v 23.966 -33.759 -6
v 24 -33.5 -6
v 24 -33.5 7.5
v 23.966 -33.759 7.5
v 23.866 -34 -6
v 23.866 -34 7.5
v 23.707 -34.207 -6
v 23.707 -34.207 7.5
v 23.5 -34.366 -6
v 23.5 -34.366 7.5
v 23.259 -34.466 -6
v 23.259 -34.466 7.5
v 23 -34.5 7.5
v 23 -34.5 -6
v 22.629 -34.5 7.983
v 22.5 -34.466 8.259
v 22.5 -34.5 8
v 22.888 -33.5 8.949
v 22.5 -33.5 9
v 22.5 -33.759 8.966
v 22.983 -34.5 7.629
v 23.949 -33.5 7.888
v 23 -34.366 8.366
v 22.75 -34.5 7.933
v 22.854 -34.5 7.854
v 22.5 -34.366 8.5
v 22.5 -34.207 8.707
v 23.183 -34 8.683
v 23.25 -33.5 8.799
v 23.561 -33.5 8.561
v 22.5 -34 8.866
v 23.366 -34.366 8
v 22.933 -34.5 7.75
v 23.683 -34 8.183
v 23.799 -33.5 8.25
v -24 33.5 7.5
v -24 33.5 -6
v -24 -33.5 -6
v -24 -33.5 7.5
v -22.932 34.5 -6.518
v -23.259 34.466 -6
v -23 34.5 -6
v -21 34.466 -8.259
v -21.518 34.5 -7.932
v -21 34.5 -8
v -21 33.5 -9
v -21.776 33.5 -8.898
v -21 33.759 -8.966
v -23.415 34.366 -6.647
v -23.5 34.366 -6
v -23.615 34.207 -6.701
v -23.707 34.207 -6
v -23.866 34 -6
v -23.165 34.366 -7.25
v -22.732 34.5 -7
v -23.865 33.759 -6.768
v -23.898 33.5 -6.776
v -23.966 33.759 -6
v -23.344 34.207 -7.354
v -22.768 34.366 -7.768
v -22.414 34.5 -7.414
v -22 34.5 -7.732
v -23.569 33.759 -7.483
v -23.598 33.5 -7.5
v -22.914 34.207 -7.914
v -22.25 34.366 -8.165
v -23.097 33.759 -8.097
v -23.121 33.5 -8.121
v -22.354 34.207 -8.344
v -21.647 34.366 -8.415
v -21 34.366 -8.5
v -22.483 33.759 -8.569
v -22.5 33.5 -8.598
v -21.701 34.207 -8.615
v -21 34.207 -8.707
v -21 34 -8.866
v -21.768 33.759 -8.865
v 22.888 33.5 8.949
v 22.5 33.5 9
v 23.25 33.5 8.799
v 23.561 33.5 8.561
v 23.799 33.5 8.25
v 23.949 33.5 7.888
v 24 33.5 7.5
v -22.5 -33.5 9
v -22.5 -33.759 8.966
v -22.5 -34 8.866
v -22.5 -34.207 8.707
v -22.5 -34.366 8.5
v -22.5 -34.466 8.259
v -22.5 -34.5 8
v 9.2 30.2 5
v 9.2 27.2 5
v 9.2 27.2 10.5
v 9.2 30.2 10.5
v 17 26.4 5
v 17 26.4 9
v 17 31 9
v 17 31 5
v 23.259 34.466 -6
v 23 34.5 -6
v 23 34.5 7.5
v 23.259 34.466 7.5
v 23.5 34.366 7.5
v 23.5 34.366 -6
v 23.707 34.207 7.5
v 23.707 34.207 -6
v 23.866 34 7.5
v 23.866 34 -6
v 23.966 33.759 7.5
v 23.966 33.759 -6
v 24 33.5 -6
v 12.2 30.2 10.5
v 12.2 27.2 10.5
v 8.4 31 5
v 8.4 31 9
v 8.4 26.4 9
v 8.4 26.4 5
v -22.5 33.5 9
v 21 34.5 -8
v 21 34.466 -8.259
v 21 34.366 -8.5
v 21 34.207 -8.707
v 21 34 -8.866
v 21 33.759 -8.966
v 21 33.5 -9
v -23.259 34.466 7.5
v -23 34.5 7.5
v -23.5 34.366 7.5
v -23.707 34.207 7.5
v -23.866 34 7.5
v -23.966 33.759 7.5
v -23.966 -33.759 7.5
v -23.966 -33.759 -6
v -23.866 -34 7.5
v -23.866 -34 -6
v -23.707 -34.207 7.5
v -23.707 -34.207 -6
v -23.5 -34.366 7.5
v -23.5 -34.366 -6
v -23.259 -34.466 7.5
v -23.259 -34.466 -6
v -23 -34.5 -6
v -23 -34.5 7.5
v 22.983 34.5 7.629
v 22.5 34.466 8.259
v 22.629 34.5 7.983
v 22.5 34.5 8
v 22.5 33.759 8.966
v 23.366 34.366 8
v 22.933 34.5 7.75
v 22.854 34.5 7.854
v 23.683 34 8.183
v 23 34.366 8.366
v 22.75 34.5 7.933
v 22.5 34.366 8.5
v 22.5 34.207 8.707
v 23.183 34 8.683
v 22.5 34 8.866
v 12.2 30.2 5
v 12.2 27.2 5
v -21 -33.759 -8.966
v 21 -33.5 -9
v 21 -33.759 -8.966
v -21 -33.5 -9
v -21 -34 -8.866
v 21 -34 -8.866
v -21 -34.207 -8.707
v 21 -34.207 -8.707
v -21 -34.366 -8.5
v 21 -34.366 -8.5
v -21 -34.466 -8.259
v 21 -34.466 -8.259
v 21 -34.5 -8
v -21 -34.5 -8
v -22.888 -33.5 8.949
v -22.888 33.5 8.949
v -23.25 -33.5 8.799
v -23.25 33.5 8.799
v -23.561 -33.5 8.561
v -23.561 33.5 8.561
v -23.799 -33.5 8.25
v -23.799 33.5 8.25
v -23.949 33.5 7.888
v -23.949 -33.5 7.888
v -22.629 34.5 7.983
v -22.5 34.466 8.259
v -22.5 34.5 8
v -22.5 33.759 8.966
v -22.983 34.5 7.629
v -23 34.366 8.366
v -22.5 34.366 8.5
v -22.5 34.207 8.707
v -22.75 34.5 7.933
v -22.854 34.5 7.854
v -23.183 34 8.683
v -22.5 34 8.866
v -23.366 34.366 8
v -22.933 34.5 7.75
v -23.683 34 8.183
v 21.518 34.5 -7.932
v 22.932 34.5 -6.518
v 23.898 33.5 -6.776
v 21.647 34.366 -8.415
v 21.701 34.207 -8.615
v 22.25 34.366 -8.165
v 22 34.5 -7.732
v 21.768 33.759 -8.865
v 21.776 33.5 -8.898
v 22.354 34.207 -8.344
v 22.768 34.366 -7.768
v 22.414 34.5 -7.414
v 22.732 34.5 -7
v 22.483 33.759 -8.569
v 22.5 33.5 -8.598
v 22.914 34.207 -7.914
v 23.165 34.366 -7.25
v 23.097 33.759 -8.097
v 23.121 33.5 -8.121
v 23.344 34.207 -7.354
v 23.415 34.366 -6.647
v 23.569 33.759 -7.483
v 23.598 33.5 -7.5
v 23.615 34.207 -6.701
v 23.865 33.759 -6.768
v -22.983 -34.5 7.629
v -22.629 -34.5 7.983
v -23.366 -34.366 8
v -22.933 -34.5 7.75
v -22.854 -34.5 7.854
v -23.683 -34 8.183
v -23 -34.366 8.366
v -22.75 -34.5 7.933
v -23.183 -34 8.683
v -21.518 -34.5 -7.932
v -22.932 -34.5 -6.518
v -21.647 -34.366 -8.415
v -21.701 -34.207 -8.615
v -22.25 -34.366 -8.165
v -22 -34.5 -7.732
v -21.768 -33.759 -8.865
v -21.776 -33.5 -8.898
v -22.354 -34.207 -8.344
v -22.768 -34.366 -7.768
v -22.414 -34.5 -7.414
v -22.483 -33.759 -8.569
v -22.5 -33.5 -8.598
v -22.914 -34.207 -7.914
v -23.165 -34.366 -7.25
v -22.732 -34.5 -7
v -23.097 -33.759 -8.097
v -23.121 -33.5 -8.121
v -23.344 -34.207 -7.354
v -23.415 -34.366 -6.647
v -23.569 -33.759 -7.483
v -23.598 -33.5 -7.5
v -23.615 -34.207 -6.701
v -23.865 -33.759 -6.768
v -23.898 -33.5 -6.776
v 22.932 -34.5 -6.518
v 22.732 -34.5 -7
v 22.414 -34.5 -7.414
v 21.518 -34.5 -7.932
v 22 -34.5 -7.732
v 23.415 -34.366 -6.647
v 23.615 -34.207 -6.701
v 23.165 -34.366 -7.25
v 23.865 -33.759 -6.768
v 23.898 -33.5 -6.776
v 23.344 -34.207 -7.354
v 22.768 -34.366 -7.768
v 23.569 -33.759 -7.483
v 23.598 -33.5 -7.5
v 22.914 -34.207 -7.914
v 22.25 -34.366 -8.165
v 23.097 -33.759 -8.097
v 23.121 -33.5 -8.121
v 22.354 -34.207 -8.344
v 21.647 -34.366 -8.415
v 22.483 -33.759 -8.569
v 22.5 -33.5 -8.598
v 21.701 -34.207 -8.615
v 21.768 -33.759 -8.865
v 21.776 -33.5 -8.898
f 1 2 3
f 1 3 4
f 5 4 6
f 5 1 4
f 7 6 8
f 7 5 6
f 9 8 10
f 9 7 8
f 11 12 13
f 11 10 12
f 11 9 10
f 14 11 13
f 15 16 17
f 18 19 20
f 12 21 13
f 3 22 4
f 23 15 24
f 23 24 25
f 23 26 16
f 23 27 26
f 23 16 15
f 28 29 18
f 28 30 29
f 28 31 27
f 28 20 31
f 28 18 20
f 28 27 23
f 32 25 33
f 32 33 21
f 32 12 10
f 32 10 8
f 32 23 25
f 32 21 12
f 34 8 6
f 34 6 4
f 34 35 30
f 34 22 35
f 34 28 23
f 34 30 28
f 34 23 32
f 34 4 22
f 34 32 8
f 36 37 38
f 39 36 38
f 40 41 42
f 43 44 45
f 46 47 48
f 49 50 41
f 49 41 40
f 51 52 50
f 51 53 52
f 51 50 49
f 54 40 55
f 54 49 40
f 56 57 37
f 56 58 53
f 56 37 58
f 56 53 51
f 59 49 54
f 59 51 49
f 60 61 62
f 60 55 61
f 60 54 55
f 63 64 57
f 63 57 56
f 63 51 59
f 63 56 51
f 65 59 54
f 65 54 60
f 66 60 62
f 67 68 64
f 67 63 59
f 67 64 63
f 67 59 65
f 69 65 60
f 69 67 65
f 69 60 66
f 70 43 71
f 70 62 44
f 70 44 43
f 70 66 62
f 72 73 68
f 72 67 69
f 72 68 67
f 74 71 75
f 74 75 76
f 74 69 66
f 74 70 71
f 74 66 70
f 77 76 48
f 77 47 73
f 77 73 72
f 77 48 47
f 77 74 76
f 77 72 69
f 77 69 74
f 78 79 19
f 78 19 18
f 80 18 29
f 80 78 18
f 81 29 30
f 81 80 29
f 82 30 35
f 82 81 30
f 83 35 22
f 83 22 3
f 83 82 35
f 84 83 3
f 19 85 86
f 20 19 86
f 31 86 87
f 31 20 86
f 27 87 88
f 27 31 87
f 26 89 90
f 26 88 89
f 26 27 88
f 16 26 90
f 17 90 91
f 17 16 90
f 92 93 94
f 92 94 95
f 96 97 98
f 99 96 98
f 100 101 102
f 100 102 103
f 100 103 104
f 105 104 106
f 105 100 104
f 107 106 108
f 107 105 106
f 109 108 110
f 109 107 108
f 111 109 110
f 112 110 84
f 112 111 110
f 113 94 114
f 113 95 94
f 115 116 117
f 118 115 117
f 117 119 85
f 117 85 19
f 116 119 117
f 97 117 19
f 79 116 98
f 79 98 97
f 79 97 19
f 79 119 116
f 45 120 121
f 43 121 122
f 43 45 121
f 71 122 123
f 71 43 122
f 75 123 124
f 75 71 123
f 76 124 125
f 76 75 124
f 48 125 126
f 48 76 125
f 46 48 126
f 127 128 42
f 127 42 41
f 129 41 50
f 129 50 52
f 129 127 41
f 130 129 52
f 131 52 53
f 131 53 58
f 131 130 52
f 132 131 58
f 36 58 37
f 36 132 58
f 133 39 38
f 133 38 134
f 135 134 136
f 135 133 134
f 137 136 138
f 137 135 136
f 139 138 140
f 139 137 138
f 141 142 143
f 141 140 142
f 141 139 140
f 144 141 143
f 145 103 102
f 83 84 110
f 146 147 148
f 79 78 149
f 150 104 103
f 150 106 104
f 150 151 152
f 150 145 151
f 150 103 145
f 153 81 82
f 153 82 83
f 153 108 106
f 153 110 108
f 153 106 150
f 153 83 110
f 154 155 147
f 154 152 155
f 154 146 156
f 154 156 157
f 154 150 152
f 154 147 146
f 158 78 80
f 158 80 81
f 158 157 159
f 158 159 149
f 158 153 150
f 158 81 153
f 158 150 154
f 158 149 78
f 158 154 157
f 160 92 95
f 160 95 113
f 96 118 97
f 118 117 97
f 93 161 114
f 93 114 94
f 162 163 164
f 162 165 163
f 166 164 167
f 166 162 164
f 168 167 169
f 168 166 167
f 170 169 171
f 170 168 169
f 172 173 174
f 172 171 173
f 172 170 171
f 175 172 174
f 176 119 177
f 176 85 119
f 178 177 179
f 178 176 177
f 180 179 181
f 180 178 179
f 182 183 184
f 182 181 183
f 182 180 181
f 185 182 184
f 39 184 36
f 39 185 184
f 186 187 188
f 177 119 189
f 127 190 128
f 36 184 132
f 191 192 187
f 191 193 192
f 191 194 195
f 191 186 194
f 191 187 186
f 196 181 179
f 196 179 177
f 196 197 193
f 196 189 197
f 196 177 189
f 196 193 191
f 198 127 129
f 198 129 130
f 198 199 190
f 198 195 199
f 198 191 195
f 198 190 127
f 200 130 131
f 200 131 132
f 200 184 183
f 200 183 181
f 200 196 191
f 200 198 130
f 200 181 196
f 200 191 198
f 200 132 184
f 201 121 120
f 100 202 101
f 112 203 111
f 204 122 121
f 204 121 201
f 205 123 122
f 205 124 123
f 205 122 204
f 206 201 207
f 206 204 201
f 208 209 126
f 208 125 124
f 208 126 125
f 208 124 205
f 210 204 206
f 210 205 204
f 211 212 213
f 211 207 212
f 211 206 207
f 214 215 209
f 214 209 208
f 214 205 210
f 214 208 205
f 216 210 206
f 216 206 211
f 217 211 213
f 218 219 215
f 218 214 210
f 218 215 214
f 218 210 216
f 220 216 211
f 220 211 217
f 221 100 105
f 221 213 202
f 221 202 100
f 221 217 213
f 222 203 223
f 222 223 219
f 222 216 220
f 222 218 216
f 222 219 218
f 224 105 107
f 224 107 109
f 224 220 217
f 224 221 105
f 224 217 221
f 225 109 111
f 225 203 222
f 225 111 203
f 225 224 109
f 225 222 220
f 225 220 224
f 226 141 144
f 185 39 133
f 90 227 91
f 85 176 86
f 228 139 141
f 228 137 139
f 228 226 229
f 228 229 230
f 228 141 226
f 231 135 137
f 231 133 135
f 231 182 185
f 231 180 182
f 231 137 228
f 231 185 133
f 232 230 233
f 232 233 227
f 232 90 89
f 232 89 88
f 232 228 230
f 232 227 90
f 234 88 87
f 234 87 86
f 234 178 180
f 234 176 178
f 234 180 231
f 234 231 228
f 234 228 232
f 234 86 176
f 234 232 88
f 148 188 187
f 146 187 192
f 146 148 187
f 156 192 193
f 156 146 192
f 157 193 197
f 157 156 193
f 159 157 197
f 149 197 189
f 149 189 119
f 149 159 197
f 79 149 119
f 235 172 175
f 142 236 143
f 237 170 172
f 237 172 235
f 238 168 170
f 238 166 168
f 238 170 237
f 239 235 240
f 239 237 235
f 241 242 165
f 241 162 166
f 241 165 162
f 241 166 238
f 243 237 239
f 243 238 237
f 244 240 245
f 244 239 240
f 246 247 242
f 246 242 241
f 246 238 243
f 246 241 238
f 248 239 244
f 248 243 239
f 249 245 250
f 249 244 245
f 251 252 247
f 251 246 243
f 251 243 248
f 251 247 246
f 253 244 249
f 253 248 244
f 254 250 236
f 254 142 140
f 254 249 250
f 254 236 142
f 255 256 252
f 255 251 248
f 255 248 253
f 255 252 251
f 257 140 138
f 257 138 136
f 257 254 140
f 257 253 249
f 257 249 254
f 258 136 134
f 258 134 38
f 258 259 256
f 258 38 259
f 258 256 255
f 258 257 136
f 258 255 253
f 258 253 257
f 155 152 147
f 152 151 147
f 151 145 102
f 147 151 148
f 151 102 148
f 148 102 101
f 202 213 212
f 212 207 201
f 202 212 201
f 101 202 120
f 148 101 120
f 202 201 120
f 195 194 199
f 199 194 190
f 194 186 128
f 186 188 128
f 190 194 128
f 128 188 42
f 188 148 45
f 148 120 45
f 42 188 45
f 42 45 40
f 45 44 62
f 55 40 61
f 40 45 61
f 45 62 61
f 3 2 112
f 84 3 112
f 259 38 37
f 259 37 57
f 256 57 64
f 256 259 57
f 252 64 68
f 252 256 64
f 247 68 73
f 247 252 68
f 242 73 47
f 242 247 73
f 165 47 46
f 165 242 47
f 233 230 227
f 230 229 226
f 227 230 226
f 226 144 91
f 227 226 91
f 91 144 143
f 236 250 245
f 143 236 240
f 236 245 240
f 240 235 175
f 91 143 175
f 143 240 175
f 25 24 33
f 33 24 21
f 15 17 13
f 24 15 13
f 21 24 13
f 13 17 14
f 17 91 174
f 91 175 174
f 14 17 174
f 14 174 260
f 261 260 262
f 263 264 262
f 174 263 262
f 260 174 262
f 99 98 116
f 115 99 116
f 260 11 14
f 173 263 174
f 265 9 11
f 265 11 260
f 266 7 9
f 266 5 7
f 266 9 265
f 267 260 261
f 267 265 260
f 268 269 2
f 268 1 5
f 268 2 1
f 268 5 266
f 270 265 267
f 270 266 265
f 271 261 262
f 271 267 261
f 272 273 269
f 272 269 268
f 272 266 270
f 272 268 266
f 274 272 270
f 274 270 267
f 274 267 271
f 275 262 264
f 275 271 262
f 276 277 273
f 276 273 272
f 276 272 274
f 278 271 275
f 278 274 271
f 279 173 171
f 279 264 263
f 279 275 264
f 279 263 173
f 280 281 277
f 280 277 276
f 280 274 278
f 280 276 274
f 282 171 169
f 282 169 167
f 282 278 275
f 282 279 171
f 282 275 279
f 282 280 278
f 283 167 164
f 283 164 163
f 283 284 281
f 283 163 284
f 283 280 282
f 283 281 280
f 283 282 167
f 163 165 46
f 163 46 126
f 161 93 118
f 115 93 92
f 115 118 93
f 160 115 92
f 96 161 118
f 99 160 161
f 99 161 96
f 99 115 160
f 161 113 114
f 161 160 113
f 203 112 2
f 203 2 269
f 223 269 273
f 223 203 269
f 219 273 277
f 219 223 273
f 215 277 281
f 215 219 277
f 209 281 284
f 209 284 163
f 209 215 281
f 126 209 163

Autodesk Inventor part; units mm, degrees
ref_plane "YZ Plane" through (0, 0, 0) normal (1, 0, 0) x (0, 1, 0)
ref_plane "XZ Plane" through (0, 0, 0) normal (0, 1, 0) x (-1, 0, 0)
ref_plane "XY Plane" through (0, 0, 0) normal (0, 0, 1) x (1, 0, 0)
sketch "スケッチ1" plane through (0, 0, 0) normal (0, 0, 1) x (1, 0, 0)
  line L0 (-24, -34.5) -> (24, -34.5)
  line L1 (24, -34.5) -> (24, 34.5)
  line L2 (24, 34.5) -> (-24, 34.5)
  line L3 (-24, 34.5) -> (-24, -34.5)
  line L4 (-24, -34.5) -> (24, 34.5) construction
  line L5 (24, -34.5) -> (-24, 34.5) construction
  point P0 (0, 0)
  dimension "d0" = 48
  dimension "d1" = 69
extrude "押し出し1" add sketch "スケッチ1" along normal mid plane 18
fillet "フィレット1" radius 3 2 edges at (24, 0, -9) (-24, 0, -9)
fillet "フィレット2" radius 1.5 2 edges at (24, 0, 9) (-24, 0, 9)
fillet "フィレット3" radius 1 16 edges at (-23.5607, 34.5, 8.5607) (-24, 34.5, 0.75) (-23.1213, 34.5, -8.1213) (0, 34.5, -9) (23.1213, 34.5, -8.1213) (24, 34.5, 0.75) (23.5607, 34.5, 8.5607) (0, 34.5, 9) (23.5607, -34.5, 8.5607) (24, -34.5, 0.75) (23.1213, -34.5, -8.1213) (0, -34.5, -9) (-23.1213, -34.5, -8.1213) (-24, -34.5, 0.75) (-23.5607, -34.5, 8.5607) (0, -34.5, 9)
sketch "スケッチ2" plane through (0, 0, 9) normal (0, 0, 1) x (1, 0, 0)
  line L0 (8.4, 26.4) -> (17, 26.4)
  line L1 (17, 26.4) -> (17, 31)
  line L2 (17, 31) -> (8.4, 31)
  line L3 (8.4, 31) -> (8.4, 26.4)
  line L4 (8.4, 26.4) -> (17, 31) construction
  line L5 (17, 26.4) -> (8.4, 31) construction
  line L6 (24, -33.5) -> (24, 33.5) construction
  line L7 (22.5, 34.5) -> (-22.5, 34.5) construction
  point P0 (0, 0)
  point P1 (12.7, 28.7)
  dimension "d7" = 7
  dimension "d8" = 3.5
  dimension "d9" = 4.6
  dimension "d10" = 8.6
extrude "押し出し2" cut sketch "スケッチ2" against normal blind 4
sketch "スケッチ3" plane through (0, 0, 5) normal (0, 0, 1) x (1, 0, 0)
  line L0 (17, 31) -> (17, 26.4) construction
  line L1 (8.4, 31) -> (17, 31) construction
  line L2 (8.4, 26.4) -> (8.4, 31) construction
  line L3 (17, 26.4) -> (8.4, 26.4) construction
  line L4 (8.4, 28.7) -> (17, 28.7) construction
  line L5 (12.2, 27.2) -> (9.2, 27.2)
  line L6 (9.2, 27.2) -> (9.2, 30.2)
  line L7 (9.2, 30.2) -> (12.2, 30.2)
  line L8 (12.2, 30.2) -> (12.2, 27.2)
  line L9 (12.2, 27.2) -> (9.2, 30.2) construction
  line L10 (9.2, 27.2) -> (12.2, 30.2) construction
  point P0 (0, 0)
  point P1 (10.7, 28.7)
  dimension "d13" = 3
  dimension "d14" = 3
  dimension "d15" = 0.8
extrude "押し出し3" add sketch "スケッチ3" along normal blind 5.5
properties part number "batt_box"
